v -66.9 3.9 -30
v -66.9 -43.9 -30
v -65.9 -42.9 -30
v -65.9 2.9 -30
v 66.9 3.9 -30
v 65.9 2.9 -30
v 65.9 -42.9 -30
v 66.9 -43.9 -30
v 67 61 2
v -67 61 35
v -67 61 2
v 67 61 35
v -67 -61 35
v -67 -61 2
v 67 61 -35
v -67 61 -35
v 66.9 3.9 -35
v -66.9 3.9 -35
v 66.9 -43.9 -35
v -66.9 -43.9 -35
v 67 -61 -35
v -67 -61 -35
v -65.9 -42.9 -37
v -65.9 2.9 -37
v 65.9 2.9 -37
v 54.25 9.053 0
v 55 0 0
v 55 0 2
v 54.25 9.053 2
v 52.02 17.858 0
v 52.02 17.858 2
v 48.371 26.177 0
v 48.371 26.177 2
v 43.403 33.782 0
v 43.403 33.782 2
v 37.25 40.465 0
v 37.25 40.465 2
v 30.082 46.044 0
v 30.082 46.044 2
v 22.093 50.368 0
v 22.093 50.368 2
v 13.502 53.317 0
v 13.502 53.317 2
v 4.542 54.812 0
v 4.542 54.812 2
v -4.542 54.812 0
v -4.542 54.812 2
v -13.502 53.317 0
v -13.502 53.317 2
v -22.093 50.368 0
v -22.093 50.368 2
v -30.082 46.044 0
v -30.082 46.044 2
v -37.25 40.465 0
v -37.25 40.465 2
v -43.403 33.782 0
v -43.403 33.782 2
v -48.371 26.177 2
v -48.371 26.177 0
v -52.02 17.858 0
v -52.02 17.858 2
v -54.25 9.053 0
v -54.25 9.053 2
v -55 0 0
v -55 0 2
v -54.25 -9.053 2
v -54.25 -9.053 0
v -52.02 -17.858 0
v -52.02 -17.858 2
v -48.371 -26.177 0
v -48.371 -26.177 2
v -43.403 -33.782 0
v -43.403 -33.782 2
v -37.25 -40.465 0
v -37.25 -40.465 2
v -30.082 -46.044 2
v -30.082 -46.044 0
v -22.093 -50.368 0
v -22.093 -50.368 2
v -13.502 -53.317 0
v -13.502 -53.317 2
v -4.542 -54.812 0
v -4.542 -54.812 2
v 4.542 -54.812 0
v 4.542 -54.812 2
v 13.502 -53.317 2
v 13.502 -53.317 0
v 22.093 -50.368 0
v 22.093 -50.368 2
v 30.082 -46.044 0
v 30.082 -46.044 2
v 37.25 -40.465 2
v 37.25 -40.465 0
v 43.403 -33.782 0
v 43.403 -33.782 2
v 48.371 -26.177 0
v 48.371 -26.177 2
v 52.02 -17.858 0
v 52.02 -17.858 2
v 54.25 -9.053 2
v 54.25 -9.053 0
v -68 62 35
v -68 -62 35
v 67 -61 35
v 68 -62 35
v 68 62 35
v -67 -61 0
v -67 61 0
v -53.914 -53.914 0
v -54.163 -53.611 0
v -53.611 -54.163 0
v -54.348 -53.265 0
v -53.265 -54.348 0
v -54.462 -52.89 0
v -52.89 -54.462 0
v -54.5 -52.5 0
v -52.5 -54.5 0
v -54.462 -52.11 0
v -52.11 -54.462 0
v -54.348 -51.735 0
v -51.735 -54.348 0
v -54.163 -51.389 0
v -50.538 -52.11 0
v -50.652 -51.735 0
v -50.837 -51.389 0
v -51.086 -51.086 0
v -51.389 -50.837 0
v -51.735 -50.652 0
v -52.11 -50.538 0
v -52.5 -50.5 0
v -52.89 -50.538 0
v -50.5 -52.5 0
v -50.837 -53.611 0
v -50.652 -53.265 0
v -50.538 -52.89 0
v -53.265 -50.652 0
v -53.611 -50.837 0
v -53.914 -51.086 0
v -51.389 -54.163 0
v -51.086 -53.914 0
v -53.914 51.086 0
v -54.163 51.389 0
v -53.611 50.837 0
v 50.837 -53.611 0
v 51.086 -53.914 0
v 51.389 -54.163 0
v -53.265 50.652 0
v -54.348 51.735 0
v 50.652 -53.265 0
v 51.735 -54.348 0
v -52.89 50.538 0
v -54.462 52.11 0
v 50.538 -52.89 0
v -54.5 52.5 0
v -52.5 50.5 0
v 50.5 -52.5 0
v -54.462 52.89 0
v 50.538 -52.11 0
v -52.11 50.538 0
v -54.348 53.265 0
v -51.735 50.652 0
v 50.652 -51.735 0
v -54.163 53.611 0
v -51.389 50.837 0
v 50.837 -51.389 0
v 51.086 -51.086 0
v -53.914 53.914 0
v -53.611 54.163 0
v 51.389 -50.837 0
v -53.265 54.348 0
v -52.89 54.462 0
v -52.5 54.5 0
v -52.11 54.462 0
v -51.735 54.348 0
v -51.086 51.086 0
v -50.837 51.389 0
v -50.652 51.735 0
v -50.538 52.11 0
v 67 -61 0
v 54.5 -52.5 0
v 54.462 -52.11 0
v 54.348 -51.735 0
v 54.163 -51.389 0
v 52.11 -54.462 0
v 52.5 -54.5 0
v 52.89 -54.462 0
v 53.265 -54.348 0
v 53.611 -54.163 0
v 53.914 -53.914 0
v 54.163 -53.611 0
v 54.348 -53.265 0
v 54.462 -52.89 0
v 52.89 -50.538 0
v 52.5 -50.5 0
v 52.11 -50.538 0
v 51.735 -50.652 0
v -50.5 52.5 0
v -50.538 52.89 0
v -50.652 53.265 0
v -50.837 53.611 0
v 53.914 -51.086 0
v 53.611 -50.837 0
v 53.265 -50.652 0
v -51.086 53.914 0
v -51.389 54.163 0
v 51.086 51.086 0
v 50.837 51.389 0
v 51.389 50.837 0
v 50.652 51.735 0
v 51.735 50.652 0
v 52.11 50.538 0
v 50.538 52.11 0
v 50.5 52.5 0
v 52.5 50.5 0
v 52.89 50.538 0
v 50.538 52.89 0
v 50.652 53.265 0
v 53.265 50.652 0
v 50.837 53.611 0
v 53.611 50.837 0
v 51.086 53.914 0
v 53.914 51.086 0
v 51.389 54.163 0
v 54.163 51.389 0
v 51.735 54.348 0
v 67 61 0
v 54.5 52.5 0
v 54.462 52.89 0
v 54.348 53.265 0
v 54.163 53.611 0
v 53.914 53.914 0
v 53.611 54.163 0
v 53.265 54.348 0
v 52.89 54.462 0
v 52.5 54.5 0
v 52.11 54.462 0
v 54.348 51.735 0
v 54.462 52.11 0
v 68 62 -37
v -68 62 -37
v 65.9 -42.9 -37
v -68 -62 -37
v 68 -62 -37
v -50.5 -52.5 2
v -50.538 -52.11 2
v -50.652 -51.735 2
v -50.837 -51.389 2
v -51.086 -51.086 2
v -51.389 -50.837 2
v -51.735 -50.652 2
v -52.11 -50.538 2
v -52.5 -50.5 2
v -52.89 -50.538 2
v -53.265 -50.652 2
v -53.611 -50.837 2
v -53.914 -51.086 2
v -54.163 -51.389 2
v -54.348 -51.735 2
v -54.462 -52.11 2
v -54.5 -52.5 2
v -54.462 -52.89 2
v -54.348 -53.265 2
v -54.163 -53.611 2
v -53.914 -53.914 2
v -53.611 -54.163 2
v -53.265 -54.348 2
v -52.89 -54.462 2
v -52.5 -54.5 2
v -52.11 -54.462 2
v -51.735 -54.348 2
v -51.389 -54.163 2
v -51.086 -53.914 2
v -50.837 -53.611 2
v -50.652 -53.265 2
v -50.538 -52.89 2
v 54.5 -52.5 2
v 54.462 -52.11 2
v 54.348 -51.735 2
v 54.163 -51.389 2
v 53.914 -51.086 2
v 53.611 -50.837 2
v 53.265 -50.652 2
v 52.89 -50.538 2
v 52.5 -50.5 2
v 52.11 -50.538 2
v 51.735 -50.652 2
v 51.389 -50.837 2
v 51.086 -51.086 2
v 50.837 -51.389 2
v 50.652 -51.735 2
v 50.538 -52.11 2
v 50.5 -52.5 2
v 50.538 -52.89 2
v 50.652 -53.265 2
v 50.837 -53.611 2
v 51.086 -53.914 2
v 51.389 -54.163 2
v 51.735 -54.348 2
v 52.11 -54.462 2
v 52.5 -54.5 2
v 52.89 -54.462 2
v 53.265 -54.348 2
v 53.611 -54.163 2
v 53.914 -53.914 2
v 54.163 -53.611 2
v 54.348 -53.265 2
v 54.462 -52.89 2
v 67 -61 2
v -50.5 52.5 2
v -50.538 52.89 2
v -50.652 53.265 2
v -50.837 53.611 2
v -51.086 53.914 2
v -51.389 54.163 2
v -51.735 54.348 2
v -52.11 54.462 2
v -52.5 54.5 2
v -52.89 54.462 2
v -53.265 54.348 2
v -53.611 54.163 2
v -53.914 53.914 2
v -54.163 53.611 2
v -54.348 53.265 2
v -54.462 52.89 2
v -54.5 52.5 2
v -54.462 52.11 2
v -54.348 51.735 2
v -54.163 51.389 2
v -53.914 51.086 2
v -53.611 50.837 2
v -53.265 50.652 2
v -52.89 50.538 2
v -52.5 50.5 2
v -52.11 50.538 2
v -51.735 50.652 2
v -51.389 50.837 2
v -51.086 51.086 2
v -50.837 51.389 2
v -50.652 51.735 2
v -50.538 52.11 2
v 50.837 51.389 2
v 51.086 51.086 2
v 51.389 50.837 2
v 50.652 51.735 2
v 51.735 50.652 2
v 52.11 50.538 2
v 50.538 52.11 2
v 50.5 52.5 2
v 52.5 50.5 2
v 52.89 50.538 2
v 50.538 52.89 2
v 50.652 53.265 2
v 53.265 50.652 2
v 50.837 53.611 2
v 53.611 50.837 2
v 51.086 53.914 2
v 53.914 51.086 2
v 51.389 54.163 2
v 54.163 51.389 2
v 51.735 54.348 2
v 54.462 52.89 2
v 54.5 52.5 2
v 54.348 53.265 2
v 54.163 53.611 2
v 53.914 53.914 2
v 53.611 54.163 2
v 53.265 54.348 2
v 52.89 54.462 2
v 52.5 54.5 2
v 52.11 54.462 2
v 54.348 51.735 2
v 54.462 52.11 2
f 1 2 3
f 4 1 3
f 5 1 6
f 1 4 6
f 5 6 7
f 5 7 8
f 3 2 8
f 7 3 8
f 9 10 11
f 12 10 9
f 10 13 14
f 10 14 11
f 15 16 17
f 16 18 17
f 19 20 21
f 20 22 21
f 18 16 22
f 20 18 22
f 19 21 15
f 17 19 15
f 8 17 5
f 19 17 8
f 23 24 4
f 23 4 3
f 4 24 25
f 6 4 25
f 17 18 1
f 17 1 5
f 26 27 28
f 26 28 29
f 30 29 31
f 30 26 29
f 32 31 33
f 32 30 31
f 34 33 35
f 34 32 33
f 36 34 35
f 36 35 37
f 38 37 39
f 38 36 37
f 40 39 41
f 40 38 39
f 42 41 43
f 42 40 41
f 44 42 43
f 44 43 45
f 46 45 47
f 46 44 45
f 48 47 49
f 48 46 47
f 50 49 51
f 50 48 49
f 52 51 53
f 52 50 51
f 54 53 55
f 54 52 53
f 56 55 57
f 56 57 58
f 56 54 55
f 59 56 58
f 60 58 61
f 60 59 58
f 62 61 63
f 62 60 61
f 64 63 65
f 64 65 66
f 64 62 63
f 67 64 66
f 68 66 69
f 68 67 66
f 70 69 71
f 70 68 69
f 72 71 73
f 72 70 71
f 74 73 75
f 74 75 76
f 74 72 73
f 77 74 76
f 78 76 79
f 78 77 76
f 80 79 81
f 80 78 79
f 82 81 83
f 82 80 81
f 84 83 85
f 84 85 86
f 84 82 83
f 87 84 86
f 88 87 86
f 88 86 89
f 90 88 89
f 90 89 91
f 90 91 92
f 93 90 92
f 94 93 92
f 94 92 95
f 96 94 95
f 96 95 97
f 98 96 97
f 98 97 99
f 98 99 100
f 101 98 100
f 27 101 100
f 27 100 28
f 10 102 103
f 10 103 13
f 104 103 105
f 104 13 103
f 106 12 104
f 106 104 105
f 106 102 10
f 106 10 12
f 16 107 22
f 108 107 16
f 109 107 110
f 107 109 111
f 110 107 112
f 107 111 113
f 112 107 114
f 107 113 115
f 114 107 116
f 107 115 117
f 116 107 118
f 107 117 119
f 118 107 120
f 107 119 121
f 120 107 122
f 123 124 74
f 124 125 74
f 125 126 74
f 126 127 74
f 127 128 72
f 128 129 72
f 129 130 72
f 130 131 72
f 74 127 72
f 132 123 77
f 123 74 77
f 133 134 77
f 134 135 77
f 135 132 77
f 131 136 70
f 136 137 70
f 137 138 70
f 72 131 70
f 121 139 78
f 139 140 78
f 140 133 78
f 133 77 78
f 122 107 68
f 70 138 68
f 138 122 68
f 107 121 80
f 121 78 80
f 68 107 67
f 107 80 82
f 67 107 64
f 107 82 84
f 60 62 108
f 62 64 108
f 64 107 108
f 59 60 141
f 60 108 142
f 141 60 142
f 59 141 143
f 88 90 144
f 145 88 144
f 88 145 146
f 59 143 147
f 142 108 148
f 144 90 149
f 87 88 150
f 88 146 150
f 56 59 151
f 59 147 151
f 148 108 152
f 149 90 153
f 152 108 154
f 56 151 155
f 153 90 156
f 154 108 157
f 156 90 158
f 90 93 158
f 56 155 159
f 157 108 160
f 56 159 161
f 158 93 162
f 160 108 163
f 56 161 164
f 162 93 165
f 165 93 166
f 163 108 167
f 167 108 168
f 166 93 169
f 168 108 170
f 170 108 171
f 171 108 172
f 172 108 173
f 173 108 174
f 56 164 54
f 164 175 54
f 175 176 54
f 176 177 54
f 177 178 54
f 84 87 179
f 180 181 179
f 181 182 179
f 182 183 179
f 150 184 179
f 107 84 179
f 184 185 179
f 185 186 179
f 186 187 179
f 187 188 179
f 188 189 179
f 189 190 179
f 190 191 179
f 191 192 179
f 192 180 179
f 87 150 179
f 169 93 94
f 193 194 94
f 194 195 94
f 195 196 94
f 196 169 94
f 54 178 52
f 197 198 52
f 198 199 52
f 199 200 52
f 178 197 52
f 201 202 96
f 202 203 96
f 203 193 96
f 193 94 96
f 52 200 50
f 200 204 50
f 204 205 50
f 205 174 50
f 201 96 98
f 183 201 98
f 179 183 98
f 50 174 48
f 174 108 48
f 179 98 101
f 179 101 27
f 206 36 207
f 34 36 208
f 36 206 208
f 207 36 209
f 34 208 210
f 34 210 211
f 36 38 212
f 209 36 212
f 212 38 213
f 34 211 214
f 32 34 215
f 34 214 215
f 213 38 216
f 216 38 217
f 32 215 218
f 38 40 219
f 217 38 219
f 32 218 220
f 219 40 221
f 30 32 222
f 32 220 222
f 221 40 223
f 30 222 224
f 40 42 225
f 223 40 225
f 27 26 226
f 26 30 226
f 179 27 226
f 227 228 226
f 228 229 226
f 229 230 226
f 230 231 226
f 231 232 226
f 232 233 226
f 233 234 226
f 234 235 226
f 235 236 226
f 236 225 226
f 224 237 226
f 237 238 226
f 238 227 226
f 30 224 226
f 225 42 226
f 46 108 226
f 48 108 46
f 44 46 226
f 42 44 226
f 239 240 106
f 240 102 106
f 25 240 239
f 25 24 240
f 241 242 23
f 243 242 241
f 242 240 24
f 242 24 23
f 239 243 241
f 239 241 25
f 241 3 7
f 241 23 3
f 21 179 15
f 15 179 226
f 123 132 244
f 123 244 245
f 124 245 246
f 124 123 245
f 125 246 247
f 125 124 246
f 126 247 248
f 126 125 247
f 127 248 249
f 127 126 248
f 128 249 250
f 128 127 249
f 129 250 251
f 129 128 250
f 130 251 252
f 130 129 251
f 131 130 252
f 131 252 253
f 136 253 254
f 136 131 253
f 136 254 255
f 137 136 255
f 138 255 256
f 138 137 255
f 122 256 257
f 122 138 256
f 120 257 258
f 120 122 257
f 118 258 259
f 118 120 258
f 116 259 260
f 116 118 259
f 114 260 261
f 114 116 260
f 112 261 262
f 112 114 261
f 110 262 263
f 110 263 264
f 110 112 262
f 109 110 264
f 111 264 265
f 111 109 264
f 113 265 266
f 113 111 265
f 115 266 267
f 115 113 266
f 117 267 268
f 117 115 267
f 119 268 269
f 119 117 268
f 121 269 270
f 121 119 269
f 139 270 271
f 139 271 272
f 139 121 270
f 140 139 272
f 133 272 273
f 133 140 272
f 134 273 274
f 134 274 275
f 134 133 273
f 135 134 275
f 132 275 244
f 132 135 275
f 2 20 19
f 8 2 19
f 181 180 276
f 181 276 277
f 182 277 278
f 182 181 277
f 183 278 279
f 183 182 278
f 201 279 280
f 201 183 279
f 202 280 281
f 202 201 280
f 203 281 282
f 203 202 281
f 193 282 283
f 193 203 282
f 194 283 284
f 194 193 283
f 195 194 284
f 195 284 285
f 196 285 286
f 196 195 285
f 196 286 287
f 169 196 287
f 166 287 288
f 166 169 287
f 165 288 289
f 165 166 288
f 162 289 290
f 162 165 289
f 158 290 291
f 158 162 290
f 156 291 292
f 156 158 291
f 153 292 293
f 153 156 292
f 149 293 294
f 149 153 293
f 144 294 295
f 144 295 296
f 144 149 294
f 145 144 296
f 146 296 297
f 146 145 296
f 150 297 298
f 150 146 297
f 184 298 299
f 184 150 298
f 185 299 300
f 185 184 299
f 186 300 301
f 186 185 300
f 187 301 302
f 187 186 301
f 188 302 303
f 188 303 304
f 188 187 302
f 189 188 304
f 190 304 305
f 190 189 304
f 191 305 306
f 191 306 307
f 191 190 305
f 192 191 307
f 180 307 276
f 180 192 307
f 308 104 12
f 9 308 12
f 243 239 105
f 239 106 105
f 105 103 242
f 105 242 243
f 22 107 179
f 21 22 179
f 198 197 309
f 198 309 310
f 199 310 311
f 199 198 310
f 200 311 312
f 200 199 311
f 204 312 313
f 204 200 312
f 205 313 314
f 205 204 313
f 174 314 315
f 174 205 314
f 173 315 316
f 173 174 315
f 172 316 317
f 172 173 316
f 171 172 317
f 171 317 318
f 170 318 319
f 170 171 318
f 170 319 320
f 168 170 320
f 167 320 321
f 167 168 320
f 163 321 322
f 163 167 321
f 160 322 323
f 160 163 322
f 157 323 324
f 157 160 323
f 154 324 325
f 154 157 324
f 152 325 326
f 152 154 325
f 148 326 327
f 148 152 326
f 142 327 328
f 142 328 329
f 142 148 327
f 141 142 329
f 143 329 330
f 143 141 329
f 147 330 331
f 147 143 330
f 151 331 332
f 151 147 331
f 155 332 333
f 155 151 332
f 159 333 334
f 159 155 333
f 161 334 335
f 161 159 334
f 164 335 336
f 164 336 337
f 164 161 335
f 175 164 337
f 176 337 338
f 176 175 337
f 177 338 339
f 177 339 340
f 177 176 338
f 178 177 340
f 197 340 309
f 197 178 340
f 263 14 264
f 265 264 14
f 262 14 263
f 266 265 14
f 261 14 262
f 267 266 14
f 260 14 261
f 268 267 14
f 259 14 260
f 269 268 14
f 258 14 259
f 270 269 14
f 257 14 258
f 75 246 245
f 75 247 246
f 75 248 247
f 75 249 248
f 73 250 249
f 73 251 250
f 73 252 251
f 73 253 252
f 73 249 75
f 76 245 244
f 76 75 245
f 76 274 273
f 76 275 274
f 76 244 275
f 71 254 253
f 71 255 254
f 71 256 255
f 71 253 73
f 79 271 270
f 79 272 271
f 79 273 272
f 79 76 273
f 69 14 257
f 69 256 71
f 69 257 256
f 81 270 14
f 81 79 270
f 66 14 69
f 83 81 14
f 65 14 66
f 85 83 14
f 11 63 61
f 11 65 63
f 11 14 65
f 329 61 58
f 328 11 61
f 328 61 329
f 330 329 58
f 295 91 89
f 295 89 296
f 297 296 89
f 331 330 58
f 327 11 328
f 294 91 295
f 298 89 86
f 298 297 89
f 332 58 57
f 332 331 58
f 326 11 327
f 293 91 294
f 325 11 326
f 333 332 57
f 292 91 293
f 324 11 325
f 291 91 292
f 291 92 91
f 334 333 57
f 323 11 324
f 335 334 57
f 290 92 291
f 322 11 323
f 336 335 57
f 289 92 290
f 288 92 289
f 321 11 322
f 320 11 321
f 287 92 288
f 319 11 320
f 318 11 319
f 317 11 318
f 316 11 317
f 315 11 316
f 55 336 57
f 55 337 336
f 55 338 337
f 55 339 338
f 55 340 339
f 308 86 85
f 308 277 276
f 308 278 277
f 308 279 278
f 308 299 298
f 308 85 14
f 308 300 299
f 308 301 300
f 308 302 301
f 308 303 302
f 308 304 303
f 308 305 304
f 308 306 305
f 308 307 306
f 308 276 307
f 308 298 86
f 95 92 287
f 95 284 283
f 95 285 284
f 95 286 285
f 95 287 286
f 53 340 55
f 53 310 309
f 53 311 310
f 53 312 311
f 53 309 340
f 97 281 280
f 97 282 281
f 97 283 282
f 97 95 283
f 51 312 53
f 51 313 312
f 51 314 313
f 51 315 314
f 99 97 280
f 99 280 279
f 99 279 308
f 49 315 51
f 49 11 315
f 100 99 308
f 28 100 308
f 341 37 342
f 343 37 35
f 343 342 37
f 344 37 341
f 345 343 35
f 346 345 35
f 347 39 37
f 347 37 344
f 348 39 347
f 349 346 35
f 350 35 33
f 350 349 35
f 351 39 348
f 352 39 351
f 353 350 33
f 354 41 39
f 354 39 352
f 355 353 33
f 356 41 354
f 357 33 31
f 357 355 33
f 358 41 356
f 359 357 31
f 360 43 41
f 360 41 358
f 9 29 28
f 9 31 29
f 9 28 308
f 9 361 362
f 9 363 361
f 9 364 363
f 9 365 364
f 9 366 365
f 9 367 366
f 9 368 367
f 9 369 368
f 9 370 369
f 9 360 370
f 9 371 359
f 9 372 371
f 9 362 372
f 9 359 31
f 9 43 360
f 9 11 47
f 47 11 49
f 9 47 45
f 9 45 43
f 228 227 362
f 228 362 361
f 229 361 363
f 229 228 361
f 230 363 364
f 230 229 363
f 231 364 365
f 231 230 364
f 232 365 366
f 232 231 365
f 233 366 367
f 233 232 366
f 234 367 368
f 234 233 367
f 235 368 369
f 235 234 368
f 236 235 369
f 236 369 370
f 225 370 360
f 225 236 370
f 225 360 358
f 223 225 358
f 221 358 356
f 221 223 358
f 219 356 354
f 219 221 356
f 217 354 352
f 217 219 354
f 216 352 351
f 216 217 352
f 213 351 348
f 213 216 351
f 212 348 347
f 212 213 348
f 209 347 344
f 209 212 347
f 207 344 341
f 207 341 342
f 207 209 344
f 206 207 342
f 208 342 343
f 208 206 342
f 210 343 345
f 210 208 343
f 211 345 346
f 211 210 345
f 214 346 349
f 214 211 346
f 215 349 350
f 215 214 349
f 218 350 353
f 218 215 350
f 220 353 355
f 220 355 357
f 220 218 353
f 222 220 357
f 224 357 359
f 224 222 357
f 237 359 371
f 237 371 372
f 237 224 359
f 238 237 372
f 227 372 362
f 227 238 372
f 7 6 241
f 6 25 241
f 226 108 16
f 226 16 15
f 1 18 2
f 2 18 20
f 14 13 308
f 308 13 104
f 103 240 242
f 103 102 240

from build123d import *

# Parameters (mm, degrees)
F0_W     = 134
F0_H     = 122
F0_R     = 2
F0_R_2   = 55
F1_DEPTH = 2
F0_W_2   = 136
F0_H_2   = 124
F2_DEPTH = 35
F3_W     = 136
F3_H     = 124
F3_W_2   = 134
F3_H_2   = 122
F3_W_3   = 133.8
F3_H_3   = 47.8
F3_W_4   = 131.8
F3_H_4   = 45.8
F4_DEPTH = 2
F5_DEPTH = 5


with BuildPart() as f1:
    # F0 (on Top) → F1 (new body)
    with BuildSketch(Plane.XY):
        Rectangle(F0_W, F0_H)
        with Locations((-52.5, -52.5)):
            Circle(F0_R, mode=Mode.SUBTRACT)
        with Locations((52.5, -52.5)):
            Circle(F0_R, mode=Mode.SUBTRACT)
        with Locations((-52.5, 52.5)):
            Circle(F0_R, mode=Mode.SUBTRACT)
        Circle(F0_R_2, mode=Mode.SUBTRACT)
        with Locations((52.5, 52.5)):
            Circle(F0_R, mode=Mode.SUBTRACT)
    extrude(amount=F1_DEPTH)

    # F0 (on Top) → F2 (join, symmetric)
    with BuildSketch(Plane.XY):
        Rectangle(F0_W_2, F0_H_2)
        Rectangle(F0_W, F0_H, mode=Mode.SUBTRACT)
    extrude(amount=F2_DEPTH, both=True)

    # F3 (on face) → F4 (join)
    with BuildSketch(Plane(origin=(0, 0, -35), x_dir=(1, 0, 0), z_dir=(0, 0, -1))):
        Rectangle(F3_W, F3_H)
        Rectangle(F3_W_2, F3_H_2, mode=Mode.SUBTRACT)
        Rectangle(F3_W_2, F3_H_2)
        with Locations((0, 20)):
            Rectangle(F3_W_3, F3_H_3, mode=Mode.SUBTRACT)
        with Locations((0, 20)):
            Rectangle(F3_W_3, F3_H_3)
        with Locations((0, 20)):
            Rectangle(F3_W_4, F3_H_4, mode=Mode.SUBTRACT)
    extrude(amount=F4_DEPTH)

    # F3 (on face) → F5 (join)
    with BuildSketch(Plane(origin=(0, 0, -35), x_dir=(1, 0, 0), z_dir=(0, 0, -1))):
        with Locations((0, 20)):
            Rectangle(F3_W_3, F3_H_3)
        with Locations((0, 20)):
            Rectangle(F3_W_4, F3_H_4, mode=Mode.SUBTRACT)
    extrude(amount=-F5_DEPTH)


solid = f1.part
